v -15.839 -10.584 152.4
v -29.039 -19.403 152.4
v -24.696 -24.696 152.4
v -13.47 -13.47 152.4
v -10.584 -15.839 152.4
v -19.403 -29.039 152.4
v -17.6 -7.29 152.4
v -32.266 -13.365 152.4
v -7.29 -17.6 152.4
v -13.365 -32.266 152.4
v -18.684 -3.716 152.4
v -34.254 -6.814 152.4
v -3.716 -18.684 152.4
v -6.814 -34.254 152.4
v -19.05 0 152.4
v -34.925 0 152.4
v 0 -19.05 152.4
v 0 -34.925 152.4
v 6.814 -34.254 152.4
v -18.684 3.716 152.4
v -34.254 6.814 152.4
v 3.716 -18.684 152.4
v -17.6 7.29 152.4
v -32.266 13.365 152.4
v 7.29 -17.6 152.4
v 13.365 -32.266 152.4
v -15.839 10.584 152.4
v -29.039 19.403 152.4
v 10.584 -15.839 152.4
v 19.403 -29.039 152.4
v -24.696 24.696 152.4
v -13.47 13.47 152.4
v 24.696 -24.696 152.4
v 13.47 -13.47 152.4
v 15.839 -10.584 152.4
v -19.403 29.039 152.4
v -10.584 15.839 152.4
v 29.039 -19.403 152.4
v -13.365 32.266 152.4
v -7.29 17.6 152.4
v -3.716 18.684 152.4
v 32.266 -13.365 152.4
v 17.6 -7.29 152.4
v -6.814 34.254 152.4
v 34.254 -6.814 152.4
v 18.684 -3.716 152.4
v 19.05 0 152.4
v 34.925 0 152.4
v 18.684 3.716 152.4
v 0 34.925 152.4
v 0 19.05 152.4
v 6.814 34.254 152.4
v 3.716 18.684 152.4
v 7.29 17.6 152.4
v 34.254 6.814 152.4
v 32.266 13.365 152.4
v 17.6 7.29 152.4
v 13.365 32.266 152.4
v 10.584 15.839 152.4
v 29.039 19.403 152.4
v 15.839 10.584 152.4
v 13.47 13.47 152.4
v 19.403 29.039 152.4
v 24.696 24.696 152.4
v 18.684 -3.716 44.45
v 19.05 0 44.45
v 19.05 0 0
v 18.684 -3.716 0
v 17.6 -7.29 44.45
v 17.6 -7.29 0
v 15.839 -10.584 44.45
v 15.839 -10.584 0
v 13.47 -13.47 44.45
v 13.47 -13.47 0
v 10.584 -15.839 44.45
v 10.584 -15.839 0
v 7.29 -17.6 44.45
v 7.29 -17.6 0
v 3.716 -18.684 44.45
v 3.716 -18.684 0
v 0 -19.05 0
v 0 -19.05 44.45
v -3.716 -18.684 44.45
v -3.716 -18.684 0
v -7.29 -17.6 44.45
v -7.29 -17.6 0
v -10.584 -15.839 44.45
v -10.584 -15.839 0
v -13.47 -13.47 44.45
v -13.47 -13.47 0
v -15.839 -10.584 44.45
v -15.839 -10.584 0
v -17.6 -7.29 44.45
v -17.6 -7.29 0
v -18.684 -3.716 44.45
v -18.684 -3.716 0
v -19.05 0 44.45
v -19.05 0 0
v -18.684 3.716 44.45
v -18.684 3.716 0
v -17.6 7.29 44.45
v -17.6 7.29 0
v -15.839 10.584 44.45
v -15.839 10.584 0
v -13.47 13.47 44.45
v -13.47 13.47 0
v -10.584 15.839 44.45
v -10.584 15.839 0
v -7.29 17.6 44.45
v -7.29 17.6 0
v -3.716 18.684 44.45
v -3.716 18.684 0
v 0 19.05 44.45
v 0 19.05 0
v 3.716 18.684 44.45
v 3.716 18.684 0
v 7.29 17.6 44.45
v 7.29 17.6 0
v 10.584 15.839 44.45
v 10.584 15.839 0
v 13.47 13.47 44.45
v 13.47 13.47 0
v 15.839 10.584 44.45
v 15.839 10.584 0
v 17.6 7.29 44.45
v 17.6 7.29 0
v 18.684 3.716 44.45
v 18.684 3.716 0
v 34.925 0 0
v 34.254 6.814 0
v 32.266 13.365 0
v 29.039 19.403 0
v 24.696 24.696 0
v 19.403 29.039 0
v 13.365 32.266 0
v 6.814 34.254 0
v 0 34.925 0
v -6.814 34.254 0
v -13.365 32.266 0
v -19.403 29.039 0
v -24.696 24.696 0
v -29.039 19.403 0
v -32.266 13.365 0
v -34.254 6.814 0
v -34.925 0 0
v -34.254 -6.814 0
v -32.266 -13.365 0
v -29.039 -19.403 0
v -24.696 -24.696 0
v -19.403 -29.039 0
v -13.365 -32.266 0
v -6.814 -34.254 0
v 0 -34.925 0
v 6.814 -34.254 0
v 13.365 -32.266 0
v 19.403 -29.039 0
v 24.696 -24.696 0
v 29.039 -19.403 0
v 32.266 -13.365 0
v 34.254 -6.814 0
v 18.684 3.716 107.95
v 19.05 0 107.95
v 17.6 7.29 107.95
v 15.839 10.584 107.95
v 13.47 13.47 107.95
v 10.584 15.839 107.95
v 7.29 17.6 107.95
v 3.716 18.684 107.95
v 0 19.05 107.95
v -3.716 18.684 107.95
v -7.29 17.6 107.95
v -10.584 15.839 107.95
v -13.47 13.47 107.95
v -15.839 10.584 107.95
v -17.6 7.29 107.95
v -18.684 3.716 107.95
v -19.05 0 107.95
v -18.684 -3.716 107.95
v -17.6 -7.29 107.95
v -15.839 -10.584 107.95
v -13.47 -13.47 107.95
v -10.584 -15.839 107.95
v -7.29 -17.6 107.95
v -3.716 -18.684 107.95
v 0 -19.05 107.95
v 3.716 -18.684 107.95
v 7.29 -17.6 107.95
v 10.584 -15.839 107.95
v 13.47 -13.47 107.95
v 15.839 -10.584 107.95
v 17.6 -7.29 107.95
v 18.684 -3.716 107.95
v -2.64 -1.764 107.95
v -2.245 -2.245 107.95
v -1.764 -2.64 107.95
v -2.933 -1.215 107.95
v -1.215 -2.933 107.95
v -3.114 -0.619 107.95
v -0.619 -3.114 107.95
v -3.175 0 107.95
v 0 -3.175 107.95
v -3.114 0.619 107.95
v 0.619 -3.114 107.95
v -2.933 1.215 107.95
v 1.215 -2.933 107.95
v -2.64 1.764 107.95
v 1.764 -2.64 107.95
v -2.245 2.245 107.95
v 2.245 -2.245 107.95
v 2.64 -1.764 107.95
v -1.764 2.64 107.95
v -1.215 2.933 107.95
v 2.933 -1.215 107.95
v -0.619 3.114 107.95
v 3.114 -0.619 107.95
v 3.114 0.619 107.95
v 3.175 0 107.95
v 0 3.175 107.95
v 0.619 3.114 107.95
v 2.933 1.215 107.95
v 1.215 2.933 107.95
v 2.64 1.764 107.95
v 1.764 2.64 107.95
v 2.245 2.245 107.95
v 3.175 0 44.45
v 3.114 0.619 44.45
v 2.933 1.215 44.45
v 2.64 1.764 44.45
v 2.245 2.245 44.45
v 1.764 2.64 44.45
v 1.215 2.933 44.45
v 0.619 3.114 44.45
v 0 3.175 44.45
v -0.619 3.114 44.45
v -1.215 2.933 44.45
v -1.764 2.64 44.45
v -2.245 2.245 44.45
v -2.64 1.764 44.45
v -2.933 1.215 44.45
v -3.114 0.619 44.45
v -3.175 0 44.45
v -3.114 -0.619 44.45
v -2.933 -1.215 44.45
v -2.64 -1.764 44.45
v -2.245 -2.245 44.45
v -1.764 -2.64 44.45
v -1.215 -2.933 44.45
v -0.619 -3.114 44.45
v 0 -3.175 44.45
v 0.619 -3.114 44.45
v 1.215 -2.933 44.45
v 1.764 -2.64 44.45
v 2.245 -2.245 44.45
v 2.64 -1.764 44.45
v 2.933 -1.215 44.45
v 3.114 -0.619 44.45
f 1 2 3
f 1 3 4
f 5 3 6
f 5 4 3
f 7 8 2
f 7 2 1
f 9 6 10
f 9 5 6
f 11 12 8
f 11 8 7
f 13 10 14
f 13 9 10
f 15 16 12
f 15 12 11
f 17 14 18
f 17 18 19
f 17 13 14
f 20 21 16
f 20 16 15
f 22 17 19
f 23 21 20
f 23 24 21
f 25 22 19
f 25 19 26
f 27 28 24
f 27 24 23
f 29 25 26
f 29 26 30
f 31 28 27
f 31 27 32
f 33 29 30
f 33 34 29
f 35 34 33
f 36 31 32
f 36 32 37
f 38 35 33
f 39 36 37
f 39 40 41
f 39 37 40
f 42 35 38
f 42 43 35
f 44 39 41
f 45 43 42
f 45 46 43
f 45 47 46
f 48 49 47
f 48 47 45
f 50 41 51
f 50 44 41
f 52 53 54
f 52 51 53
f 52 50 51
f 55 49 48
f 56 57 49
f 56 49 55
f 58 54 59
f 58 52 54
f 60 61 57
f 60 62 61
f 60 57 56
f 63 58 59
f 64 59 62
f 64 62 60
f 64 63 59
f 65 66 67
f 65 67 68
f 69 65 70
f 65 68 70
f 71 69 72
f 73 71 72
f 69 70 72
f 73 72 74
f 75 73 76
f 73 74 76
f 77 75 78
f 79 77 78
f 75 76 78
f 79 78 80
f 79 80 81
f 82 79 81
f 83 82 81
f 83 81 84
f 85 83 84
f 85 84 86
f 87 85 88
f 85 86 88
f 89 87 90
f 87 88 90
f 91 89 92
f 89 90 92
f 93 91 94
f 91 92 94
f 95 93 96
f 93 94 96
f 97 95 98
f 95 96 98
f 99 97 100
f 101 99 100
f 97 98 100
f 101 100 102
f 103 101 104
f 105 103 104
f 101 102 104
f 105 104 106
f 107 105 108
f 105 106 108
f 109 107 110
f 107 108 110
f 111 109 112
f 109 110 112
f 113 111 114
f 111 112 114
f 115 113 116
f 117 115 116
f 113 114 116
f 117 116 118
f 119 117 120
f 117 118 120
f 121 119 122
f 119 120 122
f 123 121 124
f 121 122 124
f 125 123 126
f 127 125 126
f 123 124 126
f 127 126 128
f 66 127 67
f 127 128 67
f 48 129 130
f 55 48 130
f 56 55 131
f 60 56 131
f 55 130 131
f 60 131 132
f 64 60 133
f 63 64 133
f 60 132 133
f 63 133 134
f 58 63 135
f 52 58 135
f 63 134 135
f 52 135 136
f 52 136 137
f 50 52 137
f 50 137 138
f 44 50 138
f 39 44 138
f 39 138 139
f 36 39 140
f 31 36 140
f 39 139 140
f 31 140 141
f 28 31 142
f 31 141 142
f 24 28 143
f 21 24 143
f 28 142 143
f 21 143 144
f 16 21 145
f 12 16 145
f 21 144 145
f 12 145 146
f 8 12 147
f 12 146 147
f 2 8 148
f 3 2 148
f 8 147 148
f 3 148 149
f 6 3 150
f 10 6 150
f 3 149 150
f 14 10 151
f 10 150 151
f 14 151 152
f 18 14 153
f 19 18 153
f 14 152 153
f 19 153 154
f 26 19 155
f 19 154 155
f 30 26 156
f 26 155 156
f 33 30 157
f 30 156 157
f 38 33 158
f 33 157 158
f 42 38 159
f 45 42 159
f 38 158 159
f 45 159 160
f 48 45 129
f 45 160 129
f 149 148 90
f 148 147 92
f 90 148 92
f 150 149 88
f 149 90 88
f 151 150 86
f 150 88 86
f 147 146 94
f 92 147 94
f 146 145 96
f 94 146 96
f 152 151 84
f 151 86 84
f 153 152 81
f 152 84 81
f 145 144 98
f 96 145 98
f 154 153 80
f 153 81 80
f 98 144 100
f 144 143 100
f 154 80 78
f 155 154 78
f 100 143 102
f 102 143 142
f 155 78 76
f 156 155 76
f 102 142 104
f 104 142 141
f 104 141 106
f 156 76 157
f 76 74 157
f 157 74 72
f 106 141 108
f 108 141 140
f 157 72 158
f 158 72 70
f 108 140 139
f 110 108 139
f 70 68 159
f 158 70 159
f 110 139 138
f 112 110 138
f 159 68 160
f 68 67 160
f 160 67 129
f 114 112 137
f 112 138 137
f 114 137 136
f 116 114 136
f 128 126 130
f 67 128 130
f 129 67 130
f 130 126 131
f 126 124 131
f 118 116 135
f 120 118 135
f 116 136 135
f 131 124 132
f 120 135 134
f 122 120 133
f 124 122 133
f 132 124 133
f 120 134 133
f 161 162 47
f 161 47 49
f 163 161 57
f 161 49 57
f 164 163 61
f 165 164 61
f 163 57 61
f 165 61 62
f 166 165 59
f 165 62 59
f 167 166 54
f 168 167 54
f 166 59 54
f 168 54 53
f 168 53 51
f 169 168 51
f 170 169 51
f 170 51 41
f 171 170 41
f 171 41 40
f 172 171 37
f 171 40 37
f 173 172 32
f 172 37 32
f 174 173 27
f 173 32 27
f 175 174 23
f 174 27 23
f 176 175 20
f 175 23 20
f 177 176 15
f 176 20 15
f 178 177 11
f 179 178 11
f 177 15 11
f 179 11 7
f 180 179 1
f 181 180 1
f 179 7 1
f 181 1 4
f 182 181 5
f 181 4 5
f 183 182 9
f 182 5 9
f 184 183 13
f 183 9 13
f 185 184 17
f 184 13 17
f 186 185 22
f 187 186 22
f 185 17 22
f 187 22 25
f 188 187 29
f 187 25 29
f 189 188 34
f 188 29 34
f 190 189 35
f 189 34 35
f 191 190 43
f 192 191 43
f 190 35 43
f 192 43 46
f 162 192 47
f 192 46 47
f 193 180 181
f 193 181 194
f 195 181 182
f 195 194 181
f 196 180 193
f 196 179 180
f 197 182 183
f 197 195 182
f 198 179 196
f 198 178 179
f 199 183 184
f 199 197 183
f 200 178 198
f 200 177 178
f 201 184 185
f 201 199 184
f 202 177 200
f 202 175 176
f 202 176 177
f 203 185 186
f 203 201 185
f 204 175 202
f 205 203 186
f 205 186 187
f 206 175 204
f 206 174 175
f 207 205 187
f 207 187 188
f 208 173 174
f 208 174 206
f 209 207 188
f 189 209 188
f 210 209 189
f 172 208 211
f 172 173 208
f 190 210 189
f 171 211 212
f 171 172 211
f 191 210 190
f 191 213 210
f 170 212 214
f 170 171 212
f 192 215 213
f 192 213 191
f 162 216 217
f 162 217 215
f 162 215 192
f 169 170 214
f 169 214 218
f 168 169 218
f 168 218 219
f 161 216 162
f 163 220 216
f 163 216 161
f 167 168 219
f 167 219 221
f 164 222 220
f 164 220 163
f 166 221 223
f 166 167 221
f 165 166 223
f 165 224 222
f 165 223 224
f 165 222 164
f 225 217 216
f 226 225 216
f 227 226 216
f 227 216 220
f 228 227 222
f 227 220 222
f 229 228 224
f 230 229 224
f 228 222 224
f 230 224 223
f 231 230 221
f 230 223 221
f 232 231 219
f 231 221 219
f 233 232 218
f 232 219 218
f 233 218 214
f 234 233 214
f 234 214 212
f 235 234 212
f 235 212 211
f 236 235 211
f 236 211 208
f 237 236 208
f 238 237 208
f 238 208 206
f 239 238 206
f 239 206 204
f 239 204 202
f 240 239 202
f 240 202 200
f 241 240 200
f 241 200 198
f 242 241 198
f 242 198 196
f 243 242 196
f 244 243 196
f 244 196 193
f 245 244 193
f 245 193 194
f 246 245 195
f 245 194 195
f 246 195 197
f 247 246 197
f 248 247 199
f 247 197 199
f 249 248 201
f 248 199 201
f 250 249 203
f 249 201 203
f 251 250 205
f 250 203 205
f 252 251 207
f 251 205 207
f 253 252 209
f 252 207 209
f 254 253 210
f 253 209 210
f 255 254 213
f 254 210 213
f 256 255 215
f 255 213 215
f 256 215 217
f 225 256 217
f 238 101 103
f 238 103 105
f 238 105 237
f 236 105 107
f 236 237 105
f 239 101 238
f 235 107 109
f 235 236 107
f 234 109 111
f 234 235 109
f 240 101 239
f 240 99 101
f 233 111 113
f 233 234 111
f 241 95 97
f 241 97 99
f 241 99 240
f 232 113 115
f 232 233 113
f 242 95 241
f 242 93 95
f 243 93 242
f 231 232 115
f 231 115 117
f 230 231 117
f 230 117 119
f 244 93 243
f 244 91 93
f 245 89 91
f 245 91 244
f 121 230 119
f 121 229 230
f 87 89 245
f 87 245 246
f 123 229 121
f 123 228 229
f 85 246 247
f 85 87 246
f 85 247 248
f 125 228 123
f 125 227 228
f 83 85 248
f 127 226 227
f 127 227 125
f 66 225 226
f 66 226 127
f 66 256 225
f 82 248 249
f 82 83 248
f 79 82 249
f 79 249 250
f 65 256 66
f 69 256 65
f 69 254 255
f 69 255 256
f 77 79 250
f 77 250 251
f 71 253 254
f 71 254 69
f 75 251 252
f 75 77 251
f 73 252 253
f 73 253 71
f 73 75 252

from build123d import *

# Parameters (mm, degrees)
F0_R     = 34.925
F1_DEPTH = 152.4
F2_R     = 19.05
F3_DEPTH = 44.45
F4_R     = 19.05
F5_DEPTH = 44.45
F6_R     = 3.175
F7_DEPTH = 152.4


with BuildPart() as f1:
    # F0 (on Top) → F1 (new body)
    with BuildSketch(Plane.XY):
        Circle(F0_R)
    extrude(amount=F1_DEPTH)

    # F2 (on face) → F3 (cut)
    with BuildSketch(Plane.XY.offset(152.4)):
        Circle(F2_R)
    extrude(amount=-F3_DEPTH, mode=Mode.SUBTRACT)

    # F4 (on face) → F5 (cut)
    with BuildSketch(Plane(origin=(0, 0, 0), x_dir=(1, 0, 0), z_dir=(0, 0, -1))):
        Circle(F4_R)
    extrude(amount=-F5_DEPTH, mode=Mode.SUBTRACT)

    # F6 (on face) → F7 (cut)
    with BuildSketch(Plane.XY.offset(107.95)):
        Circle(F6_R)
    extrude(amount=-F7_DEPTH, mode=Mode.SUBTRACT)


solid = f1.part
